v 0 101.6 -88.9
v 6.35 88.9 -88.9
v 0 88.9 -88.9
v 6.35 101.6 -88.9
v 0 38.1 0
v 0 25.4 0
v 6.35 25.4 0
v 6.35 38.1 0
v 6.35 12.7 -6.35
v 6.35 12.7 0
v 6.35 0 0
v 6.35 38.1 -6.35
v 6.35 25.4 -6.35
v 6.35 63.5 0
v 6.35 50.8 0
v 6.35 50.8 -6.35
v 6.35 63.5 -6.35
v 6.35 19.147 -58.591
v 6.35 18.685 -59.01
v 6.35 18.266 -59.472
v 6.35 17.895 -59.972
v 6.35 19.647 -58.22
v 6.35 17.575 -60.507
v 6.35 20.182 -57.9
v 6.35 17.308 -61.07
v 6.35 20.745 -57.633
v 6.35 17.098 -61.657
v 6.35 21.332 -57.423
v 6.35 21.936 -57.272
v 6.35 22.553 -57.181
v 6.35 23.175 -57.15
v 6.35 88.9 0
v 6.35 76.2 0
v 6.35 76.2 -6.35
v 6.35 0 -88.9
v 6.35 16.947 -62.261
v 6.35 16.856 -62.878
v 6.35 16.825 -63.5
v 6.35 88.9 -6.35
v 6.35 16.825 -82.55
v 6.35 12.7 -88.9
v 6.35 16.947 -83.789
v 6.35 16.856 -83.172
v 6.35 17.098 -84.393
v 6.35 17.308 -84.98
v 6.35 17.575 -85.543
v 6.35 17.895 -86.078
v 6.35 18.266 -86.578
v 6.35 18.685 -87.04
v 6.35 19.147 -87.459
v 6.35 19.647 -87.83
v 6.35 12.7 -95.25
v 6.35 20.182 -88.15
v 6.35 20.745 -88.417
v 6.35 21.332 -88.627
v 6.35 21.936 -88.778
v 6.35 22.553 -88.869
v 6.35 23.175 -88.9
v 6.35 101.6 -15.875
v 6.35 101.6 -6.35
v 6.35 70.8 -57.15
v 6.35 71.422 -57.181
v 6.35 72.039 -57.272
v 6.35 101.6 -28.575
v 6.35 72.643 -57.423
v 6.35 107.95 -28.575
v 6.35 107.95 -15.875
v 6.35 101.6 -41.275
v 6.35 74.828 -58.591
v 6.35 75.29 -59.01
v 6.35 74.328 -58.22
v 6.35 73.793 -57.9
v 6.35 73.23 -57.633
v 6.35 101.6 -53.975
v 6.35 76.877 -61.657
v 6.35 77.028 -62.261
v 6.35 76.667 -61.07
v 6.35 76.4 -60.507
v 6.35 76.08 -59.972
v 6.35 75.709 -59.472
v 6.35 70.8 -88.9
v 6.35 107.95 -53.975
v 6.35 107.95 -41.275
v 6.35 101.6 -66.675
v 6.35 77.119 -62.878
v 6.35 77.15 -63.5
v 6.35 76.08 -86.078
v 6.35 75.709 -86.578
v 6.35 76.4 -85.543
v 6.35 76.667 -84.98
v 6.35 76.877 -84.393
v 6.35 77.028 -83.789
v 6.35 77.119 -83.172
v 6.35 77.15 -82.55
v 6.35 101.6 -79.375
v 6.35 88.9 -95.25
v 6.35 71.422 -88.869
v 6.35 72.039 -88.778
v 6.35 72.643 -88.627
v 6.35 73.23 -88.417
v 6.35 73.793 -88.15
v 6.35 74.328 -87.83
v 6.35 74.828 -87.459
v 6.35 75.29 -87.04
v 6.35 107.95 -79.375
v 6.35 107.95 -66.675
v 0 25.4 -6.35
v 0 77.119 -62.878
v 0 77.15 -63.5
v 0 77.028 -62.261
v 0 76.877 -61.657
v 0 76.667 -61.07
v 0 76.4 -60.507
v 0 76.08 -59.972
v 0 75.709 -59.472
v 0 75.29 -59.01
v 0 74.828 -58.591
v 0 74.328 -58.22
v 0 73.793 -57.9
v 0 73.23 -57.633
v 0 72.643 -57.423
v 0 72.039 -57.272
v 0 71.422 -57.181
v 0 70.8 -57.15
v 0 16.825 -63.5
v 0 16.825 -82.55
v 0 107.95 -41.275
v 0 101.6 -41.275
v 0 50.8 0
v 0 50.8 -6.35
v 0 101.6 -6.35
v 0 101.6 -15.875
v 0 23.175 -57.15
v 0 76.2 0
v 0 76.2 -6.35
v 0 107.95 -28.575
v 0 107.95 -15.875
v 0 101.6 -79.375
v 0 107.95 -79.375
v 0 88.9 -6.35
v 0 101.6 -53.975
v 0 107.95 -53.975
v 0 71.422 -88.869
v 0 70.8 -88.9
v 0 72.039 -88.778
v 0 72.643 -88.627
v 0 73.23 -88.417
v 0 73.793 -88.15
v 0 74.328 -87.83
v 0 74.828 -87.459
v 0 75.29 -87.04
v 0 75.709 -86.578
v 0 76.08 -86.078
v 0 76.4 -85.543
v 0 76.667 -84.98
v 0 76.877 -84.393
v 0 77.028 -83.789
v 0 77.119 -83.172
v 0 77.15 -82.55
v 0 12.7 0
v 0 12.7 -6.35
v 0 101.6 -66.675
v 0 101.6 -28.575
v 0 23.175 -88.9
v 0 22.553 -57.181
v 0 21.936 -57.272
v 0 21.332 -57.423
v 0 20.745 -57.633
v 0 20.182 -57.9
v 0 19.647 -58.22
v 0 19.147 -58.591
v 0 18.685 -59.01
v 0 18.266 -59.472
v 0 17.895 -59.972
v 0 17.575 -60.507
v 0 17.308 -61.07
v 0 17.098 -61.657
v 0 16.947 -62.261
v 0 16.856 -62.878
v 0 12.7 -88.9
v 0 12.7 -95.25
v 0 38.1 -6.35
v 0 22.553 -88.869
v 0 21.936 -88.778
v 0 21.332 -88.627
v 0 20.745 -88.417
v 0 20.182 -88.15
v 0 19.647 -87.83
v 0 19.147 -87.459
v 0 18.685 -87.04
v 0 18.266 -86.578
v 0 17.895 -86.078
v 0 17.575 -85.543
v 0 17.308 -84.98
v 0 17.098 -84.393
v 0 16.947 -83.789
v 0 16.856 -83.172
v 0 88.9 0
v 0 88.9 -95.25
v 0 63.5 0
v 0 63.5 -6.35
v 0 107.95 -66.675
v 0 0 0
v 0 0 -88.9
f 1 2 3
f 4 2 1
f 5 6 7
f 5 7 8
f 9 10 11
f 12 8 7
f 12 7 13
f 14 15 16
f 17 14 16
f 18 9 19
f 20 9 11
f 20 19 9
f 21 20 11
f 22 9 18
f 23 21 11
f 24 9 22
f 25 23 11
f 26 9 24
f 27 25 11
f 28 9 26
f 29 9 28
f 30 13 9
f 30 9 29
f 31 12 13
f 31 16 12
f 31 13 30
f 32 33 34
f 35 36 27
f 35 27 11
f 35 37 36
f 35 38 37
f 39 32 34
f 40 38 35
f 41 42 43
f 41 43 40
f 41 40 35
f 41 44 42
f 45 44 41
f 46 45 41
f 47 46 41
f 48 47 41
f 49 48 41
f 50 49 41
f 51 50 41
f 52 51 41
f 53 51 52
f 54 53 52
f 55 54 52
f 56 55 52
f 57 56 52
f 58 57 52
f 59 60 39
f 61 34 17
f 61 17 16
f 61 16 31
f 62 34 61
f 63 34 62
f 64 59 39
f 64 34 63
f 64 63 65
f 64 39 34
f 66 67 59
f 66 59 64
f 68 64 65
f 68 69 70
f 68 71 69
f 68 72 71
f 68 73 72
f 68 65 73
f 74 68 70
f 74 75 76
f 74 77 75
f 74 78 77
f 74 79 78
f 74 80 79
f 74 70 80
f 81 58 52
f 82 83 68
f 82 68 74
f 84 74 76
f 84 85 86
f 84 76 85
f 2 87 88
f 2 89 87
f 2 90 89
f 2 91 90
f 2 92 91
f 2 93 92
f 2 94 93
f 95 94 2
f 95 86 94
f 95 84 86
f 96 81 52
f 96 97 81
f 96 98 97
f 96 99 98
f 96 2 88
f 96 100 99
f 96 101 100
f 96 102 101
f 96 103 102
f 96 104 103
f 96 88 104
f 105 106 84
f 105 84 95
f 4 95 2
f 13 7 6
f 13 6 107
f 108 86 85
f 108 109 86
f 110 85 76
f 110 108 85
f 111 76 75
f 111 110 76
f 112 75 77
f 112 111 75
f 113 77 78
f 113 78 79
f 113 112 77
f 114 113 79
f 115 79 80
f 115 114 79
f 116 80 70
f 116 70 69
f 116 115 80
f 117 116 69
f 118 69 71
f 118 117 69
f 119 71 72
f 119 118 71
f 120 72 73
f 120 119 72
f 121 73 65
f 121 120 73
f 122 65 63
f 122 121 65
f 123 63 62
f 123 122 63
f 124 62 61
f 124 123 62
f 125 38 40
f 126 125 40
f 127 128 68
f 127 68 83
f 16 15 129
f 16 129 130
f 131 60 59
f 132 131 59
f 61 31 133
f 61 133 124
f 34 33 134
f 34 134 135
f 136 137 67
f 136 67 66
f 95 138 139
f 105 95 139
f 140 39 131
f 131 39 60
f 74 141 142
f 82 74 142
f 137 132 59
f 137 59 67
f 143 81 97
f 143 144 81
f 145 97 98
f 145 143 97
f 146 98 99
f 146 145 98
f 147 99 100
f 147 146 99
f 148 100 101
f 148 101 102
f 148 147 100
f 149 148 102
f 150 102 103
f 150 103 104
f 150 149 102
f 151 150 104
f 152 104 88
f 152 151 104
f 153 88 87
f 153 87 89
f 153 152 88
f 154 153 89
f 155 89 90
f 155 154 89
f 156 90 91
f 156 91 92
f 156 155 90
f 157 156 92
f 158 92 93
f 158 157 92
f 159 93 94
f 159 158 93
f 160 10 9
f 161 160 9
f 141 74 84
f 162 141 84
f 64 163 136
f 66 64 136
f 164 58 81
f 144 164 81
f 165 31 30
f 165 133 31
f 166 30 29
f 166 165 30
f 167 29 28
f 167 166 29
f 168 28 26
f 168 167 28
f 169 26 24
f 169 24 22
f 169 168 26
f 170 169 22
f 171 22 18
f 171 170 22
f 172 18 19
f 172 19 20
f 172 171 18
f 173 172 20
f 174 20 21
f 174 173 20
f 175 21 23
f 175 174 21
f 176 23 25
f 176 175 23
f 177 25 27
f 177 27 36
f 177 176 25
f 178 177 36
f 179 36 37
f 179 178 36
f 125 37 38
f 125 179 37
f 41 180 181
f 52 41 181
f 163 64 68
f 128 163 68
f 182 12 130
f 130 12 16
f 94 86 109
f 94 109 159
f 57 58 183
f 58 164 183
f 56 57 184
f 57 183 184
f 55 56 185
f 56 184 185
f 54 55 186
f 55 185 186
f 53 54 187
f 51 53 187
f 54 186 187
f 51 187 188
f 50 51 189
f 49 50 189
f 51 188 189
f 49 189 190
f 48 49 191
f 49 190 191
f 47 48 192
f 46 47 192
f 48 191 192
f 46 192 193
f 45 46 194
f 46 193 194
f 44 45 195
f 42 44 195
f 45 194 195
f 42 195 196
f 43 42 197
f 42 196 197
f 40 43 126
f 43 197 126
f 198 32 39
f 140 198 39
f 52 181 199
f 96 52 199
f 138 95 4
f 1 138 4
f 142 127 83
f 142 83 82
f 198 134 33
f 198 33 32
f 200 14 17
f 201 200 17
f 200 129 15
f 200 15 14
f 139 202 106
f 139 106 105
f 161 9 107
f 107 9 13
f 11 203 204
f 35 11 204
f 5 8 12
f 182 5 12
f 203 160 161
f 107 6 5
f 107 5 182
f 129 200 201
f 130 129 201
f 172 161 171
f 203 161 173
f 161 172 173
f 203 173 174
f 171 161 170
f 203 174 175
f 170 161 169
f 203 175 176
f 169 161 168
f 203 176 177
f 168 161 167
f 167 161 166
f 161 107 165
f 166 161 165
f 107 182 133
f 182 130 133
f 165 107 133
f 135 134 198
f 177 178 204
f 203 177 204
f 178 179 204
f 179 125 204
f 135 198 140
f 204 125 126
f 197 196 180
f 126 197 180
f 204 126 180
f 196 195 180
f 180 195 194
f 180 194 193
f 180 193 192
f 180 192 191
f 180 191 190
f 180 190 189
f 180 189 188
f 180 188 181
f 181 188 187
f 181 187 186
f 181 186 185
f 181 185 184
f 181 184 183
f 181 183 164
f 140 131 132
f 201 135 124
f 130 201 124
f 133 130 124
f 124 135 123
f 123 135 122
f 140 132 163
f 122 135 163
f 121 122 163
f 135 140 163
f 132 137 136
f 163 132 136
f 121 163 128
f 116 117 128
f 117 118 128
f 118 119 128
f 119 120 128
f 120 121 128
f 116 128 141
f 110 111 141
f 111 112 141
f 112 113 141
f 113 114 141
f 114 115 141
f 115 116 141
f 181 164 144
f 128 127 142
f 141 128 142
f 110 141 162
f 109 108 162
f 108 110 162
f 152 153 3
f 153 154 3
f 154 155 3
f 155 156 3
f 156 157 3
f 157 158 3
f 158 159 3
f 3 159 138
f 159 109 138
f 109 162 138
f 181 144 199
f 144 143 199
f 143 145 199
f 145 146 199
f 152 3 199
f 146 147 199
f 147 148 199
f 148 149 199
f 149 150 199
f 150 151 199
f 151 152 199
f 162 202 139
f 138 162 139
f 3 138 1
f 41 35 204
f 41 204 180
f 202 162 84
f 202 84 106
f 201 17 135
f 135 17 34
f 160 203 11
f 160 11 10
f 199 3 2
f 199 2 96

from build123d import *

# Parameters (mm, degrees)
SKETCH1_W           = 95.25
SKETCH1_H           = 107.95
BOSS_EXTRUDE1_DEPTH = 6.35
SKETCH2_W           = 31.75
SKETCH2_H           = 60.325
CUT_EXTRUDE1_DEPTH  = 7.35
SKETCH3_W           = 15.875
SKETCH3_H           = 6.35
SKETCH3_W_2         = 12.7
CUT_EXTRUDE2_DEPTH  = 7.35
SKETCH5_W           = 6.35
SKETCH5_H           = 12.7
CUT_EXTRUDE3_DEPTH  = 7.35
SKETCH6_W           = 6.35
SKETCH6_H           = 12.7
CUT_EXTRUDE4_DEPTH  = 7.35
LPATTERN1_COUNT     = 5
LPATTERN1_PITCH     = 25.4
FILLET1_R           = 6.35


with BuildPart() as part:
    # Sketch1 → Boss-Extrude1 (new body)
    with BuildSketch(Plane(origin=(0, 0, 0), x_dir=(0, 0, -1), z_dir=(1, 0, 0))):
        with Locations((47.625, 53.975)):
            Rectangle(SKETCH1_W, SKETCH1_H)
    extrude(amount=BOSS_EXTRUDE1_DEPTH)

    # Sketch2 → Cut-Extrude1 (cut, through all)
    with BuildSketch(Plane(origin=(6.35, 0, 0), x_dir=(0, 0, -1), z_dir=(1, 0, 0))):
        with Locations((73.025, 46.9875)):
            Rectangle(SKETCH2_W, SKETCH2_H)
    extrude(amount=-CUT_EXTRUDE1_DEPTH, mode=Mode.SUBTRACT)

    # Sketch3 → Cut-Extrude2 (cut, through all)
    with BuildSketch(Plane(origin=(6.35, 0, 0), x_dir=(0, 0, -1), z_dir=(1, 0, 0))):
        with Locations((7.9375, 104.775)):
            Rectangle(SKETCH3_W, SKETCH3_H)
        with Locations((34.925, 104.775)):
            Rectangle(SKETCH3_W_2, SKETCH3_H)
        with Locations((60.325, 104.775)):
            Rectangle(SKETCH3_W_2, SKETCH3_H)
        with Locations((87.3125, 104.775)):
            Rectangle(SKETCH3_W, SKETCH3_H)
    extrude(amount=-CUT_EXTRUDE2_DEPTH, mode=Mode.SUBTRACT)

    # Sketch5 → Cut-Extrude3 (cut, through all)
    with BuildSketch(Plane(origin=(6.35, 0, 0), x_dir=(0, 0, -1), z_dir=(1, 0, 0))):
        with Locations((92.075, 95.25)):
            Rectangle(SKETCH5_W, SKETCH5_H)
        with Locations((92.075, 6.35)):
            Rectangle(SKETCH5_W, SKETCH5_H)
    extrude(amount=-CUT_EXTRUDE3_DEPTH, mode=Mode.SUBTRACT)

    # Sketch6 → Cut-Extrude4 (cut, through all)
    with BuildSketch(Plane(origin=(6.35, 0, 0), x_dir=(0, 0, -1), z_dir=(1, 0, 0))):
        with Locations((3.175, 95.25)):
            Rectangle(SKETCH6_W, SKETCH6_H)
    cut_extrude4 = extrude(amount=-CUT_EXTRUDE4_DEPTH, mode=Mode.SUBTRACT)

    # LPattern1: Cut-Extrude4 ×5
    with Locations(*[(0, -i * LPATTERN1_PITCH, 0) for i in range(1, LPATTERN1_COUNT)]):
        add(cut_extrude4, mode=Mode.SUBTRACT)

    # Fillet1
    fillet1_edges = [part.edges().sort_by_distance(p)[0] for p in [
        (3.175, 16.825, -57.15),
        (3.175, 77.15, -57.15),
        (3.175, 77.15, -88.9),
        (3.175, 16.825, -88.9),
    ]]
    fillet(fillet1_edges, radius=FILLET1_R)


solid = part.part
